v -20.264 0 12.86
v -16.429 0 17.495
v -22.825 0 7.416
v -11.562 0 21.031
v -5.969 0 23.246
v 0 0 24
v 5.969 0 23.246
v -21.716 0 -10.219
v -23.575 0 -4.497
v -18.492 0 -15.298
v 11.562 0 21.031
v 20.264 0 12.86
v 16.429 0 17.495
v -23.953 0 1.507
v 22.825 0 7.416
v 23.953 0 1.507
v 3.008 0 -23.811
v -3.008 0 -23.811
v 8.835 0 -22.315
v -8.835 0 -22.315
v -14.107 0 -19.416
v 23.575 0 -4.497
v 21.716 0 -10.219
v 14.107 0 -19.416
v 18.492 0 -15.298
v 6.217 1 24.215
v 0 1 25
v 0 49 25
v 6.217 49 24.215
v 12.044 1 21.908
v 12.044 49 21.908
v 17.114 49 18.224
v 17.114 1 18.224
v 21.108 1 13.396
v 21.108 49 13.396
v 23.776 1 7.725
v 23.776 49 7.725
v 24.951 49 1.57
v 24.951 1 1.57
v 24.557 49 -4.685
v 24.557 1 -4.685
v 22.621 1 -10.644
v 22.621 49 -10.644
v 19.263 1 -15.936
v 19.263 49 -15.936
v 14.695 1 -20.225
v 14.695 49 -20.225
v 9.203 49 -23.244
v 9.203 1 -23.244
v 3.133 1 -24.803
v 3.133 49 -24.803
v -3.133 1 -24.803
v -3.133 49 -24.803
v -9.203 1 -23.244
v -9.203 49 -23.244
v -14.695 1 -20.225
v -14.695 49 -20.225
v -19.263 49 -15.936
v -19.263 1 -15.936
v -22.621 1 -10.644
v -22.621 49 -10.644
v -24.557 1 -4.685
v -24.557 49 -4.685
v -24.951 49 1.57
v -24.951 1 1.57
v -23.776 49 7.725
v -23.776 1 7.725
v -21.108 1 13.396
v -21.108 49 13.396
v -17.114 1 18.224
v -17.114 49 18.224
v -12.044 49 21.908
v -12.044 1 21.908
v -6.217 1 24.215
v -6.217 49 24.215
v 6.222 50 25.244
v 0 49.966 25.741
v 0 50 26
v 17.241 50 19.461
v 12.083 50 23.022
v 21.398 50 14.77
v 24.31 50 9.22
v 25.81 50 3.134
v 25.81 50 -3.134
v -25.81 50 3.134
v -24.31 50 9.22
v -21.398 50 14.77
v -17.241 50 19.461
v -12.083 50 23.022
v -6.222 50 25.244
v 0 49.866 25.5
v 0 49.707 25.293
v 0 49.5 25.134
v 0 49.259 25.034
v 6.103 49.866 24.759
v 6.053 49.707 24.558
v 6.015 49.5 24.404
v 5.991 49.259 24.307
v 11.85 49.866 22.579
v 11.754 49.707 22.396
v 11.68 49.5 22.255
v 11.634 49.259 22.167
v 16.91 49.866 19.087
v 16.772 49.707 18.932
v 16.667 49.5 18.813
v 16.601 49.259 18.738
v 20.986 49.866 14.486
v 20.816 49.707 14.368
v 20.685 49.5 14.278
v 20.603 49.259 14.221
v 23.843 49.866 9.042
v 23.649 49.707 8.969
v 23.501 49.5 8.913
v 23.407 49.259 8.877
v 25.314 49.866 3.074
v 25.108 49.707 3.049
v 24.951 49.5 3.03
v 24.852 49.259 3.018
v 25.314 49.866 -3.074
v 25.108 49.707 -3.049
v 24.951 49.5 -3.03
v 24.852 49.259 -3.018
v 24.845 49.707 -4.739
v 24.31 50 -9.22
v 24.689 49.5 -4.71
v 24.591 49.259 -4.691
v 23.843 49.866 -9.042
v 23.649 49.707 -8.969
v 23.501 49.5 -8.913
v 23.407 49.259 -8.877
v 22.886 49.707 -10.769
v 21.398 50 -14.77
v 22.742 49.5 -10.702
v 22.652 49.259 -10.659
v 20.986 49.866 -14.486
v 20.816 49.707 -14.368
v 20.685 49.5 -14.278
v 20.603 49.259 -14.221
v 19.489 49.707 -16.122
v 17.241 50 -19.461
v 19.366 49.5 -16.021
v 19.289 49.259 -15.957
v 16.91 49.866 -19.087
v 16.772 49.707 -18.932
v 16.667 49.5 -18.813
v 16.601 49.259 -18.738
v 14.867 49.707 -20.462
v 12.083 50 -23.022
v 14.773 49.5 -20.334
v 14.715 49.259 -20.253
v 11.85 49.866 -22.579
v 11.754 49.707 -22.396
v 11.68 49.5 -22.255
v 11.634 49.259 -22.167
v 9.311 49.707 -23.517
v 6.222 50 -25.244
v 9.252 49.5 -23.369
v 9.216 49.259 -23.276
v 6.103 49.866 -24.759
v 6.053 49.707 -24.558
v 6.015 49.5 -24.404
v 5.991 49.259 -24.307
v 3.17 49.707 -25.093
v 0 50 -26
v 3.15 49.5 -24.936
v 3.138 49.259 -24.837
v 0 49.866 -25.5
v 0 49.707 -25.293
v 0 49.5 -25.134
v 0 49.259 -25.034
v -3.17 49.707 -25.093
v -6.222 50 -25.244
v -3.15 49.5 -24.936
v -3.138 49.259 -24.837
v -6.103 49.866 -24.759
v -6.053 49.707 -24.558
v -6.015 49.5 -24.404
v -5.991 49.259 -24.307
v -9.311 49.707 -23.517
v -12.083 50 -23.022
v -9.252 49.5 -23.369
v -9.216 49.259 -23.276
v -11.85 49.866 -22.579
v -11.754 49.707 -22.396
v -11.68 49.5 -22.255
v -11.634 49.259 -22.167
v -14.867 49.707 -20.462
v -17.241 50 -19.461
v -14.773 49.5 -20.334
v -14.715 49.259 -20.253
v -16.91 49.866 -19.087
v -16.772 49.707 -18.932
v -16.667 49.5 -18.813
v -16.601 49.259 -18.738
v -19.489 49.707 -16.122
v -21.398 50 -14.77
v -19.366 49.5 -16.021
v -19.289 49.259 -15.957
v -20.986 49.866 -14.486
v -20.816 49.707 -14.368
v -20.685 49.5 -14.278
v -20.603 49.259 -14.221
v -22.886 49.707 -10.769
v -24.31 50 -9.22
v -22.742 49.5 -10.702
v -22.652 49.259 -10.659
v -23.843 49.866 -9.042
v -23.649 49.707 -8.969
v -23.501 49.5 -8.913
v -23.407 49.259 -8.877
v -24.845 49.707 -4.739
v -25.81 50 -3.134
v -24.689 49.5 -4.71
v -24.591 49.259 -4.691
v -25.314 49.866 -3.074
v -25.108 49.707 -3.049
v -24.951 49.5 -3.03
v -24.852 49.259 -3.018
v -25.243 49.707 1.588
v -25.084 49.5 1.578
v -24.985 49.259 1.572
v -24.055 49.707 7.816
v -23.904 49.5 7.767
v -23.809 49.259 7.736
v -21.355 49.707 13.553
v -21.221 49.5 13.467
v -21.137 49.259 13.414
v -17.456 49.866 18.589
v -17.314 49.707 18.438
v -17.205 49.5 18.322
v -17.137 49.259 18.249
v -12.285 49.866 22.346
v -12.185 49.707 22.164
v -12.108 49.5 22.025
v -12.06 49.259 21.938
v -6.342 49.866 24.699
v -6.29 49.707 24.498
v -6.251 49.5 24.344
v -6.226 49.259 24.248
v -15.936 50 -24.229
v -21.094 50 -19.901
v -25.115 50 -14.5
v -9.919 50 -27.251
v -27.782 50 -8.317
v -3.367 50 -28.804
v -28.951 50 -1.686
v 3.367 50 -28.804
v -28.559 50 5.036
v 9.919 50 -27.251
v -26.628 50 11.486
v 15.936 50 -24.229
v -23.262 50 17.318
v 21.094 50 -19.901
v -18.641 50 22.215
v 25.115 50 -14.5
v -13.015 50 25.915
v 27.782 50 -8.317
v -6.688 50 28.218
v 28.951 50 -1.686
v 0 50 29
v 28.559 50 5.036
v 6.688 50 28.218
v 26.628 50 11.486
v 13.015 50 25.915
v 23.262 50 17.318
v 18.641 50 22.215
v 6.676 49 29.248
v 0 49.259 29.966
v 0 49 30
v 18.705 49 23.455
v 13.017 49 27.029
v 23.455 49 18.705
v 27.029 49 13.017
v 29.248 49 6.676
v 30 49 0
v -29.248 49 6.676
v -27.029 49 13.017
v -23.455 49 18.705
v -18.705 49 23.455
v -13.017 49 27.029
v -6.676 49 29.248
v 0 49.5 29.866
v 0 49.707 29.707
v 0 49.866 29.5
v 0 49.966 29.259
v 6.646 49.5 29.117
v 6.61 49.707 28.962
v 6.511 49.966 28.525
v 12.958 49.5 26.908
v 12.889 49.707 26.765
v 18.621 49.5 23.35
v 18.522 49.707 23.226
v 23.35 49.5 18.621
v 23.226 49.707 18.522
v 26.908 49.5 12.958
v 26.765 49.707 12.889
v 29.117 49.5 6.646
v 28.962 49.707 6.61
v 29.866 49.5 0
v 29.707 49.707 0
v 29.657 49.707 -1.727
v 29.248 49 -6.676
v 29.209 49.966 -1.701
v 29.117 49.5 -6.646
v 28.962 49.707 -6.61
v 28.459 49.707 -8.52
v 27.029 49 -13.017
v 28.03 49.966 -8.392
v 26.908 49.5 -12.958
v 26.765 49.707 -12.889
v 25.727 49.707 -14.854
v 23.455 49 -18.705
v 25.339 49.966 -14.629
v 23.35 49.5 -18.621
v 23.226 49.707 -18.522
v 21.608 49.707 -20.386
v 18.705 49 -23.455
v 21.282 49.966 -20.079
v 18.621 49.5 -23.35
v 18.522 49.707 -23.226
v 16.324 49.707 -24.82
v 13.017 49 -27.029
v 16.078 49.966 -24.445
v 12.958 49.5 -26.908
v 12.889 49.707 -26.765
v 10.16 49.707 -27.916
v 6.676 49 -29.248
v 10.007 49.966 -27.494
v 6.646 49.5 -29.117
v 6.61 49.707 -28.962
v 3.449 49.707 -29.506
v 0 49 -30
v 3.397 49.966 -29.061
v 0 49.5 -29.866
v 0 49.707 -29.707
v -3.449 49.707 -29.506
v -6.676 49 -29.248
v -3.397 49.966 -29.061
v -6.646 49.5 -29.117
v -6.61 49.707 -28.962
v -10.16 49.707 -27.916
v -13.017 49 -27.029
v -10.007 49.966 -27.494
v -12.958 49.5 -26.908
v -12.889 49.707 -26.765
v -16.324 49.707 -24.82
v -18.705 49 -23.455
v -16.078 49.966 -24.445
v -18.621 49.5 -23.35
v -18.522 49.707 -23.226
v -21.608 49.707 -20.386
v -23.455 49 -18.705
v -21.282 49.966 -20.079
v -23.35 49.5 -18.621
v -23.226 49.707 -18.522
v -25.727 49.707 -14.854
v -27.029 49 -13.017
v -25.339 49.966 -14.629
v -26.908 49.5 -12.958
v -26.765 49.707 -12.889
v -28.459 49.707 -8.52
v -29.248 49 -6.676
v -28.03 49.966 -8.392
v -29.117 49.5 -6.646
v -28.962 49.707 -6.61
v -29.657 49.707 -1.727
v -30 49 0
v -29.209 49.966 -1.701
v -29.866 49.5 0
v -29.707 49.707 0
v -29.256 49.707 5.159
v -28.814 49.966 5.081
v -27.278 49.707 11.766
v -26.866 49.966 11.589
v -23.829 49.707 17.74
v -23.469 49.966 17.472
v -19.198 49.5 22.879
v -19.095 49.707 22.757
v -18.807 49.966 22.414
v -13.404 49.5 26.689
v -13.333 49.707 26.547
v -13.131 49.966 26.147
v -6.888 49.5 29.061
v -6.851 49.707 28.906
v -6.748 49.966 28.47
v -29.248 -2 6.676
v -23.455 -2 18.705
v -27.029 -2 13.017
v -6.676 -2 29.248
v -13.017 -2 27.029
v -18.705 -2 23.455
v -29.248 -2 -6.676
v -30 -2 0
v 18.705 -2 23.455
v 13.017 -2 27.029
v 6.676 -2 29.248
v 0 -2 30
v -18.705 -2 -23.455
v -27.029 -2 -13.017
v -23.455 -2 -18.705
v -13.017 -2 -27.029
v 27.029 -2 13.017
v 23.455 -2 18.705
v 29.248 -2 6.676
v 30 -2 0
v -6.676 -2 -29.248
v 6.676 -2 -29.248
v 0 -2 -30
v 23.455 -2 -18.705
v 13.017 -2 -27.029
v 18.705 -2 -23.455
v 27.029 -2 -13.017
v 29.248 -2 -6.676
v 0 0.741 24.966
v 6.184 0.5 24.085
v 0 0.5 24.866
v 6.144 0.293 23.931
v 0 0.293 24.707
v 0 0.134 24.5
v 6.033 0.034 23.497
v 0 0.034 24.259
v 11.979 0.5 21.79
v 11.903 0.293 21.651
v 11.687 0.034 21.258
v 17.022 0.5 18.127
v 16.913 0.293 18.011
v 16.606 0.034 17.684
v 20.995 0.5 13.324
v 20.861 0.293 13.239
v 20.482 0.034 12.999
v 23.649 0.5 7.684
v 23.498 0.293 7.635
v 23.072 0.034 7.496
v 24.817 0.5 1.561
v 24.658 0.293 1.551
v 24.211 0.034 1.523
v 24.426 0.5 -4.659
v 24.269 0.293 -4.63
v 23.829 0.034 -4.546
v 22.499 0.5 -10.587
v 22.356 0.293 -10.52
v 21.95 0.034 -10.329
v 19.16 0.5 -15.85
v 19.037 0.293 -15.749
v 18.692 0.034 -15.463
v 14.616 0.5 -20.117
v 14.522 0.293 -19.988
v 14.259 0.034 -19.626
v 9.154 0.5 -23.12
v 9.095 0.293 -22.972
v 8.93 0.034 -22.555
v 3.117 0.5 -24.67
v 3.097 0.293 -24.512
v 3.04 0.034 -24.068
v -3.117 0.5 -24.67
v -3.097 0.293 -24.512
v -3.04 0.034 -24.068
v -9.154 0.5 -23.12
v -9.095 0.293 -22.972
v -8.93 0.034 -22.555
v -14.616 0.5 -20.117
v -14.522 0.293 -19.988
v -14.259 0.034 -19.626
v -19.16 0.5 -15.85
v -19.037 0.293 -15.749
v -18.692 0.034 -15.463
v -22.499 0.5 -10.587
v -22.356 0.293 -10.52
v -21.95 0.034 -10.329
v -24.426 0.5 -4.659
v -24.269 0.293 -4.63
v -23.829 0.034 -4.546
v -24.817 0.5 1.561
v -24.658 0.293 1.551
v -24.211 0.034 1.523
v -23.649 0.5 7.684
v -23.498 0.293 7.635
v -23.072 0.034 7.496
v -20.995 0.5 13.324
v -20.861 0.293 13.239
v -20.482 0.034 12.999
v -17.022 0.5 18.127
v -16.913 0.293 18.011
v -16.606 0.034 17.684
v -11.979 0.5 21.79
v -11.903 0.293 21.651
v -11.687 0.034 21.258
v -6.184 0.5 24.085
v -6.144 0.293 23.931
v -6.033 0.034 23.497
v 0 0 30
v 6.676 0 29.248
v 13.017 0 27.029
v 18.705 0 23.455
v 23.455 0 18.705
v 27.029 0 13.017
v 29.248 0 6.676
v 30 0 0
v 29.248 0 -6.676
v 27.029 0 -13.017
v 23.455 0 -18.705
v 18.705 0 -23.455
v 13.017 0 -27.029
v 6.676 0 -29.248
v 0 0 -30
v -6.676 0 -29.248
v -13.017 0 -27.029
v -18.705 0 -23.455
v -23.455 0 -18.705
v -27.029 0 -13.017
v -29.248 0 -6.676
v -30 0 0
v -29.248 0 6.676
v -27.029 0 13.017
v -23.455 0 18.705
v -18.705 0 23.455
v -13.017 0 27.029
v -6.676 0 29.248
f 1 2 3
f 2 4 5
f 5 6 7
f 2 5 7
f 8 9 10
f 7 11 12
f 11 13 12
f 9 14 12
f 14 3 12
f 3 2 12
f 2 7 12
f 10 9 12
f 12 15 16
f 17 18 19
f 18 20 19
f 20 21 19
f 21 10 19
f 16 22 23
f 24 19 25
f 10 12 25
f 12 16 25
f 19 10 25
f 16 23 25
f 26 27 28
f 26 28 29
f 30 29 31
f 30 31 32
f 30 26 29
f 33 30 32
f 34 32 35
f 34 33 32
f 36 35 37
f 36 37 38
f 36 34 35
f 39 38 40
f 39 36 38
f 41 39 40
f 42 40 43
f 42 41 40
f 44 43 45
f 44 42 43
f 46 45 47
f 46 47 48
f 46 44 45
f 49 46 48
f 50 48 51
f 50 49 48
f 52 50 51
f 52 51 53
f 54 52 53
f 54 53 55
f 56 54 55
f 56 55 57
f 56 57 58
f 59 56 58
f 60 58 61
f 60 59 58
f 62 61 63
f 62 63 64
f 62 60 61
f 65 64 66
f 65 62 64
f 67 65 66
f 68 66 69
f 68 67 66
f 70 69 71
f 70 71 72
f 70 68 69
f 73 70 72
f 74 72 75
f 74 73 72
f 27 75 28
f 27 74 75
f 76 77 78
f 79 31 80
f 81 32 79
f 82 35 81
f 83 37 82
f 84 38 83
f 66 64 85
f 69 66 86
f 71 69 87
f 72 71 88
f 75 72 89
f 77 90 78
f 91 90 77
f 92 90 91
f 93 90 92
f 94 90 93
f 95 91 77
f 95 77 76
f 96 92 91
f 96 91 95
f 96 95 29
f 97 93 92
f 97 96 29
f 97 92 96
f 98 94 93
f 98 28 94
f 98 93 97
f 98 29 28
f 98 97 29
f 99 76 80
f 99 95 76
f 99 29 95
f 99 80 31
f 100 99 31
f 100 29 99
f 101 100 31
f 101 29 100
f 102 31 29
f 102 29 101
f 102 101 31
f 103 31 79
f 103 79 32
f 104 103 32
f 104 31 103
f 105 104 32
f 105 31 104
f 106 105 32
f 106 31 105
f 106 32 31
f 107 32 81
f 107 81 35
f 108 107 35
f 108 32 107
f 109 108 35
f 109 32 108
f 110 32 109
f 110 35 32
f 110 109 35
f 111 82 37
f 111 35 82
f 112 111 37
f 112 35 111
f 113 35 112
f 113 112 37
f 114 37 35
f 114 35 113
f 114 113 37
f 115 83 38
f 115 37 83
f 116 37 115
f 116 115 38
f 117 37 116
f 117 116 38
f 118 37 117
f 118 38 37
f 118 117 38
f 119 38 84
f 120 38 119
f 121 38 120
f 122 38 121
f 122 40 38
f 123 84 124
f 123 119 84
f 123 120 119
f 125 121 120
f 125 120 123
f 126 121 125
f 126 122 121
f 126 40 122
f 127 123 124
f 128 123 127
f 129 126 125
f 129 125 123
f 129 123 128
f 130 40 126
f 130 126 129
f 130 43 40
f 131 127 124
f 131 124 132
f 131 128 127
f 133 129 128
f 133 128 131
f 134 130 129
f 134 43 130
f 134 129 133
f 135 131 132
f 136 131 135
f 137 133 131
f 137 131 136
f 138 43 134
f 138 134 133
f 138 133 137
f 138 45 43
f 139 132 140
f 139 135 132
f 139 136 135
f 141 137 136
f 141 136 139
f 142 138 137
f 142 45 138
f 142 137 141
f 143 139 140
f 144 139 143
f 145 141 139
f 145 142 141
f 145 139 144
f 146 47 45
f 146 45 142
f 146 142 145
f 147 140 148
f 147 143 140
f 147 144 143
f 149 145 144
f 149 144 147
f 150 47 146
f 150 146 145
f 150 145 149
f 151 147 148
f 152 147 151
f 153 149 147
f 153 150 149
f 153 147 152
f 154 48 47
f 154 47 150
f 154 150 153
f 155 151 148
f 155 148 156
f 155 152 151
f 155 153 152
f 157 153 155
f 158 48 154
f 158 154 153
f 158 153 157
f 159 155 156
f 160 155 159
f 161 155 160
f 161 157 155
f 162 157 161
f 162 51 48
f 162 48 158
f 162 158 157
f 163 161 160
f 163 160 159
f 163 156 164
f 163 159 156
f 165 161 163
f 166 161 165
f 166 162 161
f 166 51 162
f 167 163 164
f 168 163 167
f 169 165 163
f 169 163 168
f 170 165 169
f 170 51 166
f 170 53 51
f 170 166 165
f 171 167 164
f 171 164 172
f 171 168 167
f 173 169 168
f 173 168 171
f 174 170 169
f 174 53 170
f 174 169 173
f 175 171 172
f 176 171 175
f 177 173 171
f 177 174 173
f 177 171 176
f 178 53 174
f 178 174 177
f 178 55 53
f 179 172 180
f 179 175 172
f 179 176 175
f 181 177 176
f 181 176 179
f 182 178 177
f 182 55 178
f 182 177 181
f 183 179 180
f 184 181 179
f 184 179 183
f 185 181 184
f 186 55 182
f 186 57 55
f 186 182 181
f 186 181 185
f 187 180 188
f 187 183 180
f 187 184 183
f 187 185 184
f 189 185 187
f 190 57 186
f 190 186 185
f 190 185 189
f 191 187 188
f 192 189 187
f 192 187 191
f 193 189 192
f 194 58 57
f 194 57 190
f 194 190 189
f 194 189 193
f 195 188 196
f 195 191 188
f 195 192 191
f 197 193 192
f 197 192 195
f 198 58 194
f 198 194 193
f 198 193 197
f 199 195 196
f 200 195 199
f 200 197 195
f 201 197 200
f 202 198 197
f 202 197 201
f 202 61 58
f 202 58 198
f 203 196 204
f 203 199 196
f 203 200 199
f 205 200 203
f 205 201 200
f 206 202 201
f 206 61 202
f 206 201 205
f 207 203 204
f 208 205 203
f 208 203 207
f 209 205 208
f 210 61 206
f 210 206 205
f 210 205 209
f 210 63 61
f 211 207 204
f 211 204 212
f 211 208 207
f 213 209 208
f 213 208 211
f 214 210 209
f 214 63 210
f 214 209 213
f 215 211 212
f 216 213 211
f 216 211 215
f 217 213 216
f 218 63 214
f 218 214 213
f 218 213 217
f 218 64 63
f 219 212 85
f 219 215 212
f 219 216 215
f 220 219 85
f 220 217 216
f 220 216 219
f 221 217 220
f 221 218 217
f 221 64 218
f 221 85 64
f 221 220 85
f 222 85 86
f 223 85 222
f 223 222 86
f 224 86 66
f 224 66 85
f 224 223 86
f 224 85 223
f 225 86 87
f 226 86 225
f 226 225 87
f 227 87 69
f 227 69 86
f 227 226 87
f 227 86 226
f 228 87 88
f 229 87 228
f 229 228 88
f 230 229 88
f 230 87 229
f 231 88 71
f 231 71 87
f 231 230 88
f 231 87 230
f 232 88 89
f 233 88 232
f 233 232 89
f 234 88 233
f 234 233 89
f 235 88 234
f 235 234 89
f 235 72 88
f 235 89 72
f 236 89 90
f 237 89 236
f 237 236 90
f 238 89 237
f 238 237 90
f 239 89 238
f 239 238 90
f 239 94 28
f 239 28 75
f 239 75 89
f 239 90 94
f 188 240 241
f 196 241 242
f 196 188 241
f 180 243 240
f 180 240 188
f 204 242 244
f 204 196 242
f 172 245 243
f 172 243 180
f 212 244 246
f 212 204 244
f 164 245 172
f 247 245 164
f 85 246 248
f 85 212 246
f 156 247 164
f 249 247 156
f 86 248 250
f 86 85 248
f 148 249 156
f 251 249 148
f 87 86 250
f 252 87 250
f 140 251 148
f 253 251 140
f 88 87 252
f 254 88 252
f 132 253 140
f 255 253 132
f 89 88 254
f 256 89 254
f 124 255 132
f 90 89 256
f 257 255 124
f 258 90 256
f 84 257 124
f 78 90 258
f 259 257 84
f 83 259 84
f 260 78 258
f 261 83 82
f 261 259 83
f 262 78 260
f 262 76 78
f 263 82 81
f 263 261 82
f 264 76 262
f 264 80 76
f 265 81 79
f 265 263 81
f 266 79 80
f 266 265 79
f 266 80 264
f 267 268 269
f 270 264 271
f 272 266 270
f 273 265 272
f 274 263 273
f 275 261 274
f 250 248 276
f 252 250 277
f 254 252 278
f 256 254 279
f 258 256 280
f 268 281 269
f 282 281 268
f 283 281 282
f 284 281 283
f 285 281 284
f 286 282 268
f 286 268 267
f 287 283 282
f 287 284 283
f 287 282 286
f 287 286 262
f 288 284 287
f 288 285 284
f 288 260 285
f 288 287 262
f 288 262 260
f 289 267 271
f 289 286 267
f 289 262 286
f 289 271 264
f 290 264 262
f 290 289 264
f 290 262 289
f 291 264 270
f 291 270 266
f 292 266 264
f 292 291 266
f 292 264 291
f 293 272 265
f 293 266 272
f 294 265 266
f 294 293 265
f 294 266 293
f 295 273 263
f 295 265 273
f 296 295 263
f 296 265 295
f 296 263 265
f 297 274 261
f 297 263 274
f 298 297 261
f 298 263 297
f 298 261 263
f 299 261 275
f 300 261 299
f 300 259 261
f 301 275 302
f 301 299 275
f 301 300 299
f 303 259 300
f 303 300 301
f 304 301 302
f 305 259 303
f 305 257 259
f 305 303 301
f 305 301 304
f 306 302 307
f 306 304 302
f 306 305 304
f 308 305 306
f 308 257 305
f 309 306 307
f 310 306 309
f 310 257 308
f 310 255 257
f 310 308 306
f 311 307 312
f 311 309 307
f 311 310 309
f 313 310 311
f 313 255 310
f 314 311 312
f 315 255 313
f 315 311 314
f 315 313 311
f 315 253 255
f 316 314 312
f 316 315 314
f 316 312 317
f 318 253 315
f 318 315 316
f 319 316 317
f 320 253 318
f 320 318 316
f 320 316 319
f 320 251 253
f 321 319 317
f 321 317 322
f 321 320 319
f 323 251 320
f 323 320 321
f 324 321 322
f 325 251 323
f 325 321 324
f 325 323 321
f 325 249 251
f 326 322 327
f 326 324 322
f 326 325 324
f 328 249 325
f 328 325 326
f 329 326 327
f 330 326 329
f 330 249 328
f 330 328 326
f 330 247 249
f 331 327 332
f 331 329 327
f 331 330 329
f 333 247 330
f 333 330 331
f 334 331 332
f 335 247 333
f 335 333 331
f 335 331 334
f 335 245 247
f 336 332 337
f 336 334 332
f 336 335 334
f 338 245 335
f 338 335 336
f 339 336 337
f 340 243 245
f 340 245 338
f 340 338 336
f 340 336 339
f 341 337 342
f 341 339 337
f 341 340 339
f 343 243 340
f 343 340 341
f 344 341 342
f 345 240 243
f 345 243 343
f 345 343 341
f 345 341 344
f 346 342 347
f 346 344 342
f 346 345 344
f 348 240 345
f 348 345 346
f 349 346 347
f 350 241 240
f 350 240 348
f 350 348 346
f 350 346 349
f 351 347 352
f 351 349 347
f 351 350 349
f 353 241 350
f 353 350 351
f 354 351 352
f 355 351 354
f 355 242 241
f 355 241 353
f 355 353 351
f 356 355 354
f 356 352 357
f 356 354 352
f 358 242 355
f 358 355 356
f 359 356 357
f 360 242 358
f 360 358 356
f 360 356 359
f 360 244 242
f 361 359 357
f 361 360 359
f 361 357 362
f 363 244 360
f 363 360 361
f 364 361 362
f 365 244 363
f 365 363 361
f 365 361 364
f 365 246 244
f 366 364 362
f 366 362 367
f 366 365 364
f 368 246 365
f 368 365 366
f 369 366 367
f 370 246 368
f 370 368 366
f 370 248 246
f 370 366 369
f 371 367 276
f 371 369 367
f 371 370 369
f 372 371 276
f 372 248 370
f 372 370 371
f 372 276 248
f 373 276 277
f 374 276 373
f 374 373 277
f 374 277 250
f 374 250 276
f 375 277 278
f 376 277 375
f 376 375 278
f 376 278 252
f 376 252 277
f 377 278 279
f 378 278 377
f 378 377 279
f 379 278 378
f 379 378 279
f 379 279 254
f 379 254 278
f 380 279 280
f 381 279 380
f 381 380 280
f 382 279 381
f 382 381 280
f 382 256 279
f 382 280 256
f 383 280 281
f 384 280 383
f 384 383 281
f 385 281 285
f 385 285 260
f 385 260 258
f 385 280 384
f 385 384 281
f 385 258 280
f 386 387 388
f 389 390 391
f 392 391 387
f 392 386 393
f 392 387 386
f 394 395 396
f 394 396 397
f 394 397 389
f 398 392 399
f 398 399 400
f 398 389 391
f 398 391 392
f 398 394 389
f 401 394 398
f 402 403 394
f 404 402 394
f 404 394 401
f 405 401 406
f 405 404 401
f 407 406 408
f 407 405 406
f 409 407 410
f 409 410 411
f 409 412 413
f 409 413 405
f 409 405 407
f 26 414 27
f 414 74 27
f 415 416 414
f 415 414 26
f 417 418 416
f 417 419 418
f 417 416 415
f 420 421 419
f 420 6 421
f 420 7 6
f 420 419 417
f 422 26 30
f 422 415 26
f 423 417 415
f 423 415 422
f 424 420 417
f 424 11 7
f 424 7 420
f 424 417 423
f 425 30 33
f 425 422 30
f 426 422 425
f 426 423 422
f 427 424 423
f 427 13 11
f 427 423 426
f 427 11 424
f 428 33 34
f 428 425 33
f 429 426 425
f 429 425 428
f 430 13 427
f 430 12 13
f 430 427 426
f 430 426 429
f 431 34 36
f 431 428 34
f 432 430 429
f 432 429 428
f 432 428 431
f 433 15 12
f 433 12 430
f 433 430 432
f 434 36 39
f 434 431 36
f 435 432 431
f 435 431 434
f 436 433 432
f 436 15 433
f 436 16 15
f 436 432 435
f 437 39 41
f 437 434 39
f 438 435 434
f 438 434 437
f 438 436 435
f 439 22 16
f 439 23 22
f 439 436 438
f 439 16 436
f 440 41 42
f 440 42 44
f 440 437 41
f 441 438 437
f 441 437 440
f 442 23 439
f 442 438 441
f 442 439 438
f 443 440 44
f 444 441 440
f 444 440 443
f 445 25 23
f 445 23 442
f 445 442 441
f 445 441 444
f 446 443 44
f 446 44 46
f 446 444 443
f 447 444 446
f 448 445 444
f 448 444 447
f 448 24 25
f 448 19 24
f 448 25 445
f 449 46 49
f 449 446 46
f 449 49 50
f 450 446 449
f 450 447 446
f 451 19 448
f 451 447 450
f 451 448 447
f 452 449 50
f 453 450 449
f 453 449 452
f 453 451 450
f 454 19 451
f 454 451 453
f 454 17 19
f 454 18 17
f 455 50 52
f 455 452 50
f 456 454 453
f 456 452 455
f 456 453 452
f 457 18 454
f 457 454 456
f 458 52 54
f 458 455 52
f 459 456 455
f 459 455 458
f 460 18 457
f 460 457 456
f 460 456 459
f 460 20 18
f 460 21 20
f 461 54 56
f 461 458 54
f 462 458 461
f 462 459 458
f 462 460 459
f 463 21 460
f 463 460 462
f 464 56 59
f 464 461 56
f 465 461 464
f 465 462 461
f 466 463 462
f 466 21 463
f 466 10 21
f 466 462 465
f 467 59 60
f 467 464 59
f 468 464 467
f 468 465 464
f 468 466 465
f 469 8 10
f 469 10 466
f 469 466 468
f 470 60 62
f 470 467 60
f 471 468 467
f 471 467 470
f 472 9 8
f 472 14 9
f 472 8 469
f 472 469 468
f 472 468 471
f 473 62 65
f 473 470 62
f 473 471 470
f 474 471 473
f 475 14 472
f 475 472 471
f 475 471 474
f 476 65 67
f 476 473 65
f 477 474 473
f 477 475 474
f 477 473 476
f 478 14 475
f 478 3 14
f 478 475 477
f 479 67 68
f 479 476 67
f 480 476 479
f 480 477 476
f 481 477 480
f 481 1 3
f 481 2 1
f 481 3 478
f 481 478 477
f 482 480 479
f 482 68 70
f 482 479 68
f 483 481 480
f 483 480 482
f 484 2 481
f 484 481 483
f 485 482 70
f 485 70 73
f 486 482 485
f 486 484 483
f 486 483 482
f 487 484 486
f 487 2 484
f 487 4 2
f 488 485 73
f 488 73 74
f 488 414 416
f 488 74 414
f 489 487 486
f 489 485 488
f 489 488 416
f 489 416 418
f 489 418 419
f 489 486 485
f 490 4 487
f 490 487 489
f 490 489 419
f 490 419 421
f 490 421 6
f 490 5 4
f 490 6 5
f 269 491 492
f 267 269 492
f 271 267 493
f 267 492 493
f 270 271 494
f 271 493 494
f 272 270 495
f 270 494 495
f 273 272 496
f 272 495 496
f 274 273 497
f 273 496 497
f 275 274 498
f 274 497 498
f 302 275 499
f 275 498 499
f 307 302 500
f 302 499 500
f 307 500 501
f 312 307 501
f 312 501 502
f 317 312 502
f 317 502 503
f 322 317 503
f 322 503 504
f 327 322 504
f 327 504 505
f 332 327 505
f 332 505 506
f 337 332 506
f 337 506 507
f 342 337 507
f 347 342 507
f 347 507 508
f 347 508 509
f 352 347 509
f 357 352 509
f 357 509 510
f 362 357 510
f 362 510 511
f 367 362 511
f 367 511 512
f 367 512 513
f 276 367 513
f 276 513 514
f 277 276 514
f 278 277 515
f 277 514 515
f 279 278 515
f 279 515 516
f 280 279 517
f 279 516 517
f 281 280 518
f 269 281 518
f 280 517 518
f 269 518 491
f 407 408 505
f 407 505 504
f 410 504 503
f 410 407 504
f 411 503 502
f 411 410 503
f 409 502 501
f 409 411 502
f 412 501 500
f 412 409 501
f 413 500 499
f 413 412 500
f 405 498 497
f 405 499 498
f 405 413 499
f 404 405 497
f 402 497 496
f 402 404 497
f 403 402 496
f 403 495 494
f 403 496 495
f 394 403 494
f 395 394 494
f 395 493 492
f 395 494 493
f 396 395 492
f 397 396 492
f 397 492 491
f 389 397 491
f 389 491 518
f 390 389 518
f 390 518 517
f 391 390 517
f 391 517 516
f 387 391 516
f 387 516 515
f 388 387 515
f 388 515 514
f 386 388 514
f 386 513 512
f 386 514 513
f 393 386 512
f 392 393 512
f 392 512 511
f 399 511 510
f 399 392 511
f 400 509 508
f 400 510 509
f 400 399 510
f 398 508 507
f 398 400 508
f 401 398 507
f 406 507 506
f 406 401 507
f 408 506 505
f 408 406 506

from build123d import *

# Parameters (mm, degrees)
SKETCH1_R           = 30
SKETCH1_R_2         = 25
BOSS_EXTRUDE1_DEPTH = 50
BOSS_EXTRUDE2_START = 2
SKETCH2_R           = 30
BOSS_EXTRUDE2_DEPTH = 2
FILLET1_R           = 1


with BuildPart() as part:
    # Sketch1 → Boss-Extrude1 (new body)
    with BuildSketch(Plane(origin=(0, 0, 0), x_dir=(1, 0, 0), z_dir=(0, 1, 0))):
        with Locations(Location((0, 0, 0), (0, 0, 270))):
            Circle(SKETCH1_R)
        with Locations(Location((0, 0, 0), (0, 0, 270))):
            Circle(SKETCH1_R_2, mode=Mode.SUBTRACT)
    extrude(amount=BOSS_EXTRUDE1_DEPTH)

    # Sketch2 → Boss-Extrude2 (add)
    with BuildSketch(Plane.XZ.offset(BOSS_EXTRUDE2_START)):
        with Locations(Location((0, 0, 0), (0, 0, 270))):
            Circle(SKETCH2_R)
    extrude(amount=-BOSS_EXTRUDE2_DEPTH)

    # Fillet1
    fillet1_edges = [part.edges().sort_by_distance(p)[0] for p in [
        (0, 50, -30),
        (0, 0, -25),
        (0, 50, -25),
    ]]
    fillet(fillet1_edges, radius=FILLET1_R)


solid = part.part
